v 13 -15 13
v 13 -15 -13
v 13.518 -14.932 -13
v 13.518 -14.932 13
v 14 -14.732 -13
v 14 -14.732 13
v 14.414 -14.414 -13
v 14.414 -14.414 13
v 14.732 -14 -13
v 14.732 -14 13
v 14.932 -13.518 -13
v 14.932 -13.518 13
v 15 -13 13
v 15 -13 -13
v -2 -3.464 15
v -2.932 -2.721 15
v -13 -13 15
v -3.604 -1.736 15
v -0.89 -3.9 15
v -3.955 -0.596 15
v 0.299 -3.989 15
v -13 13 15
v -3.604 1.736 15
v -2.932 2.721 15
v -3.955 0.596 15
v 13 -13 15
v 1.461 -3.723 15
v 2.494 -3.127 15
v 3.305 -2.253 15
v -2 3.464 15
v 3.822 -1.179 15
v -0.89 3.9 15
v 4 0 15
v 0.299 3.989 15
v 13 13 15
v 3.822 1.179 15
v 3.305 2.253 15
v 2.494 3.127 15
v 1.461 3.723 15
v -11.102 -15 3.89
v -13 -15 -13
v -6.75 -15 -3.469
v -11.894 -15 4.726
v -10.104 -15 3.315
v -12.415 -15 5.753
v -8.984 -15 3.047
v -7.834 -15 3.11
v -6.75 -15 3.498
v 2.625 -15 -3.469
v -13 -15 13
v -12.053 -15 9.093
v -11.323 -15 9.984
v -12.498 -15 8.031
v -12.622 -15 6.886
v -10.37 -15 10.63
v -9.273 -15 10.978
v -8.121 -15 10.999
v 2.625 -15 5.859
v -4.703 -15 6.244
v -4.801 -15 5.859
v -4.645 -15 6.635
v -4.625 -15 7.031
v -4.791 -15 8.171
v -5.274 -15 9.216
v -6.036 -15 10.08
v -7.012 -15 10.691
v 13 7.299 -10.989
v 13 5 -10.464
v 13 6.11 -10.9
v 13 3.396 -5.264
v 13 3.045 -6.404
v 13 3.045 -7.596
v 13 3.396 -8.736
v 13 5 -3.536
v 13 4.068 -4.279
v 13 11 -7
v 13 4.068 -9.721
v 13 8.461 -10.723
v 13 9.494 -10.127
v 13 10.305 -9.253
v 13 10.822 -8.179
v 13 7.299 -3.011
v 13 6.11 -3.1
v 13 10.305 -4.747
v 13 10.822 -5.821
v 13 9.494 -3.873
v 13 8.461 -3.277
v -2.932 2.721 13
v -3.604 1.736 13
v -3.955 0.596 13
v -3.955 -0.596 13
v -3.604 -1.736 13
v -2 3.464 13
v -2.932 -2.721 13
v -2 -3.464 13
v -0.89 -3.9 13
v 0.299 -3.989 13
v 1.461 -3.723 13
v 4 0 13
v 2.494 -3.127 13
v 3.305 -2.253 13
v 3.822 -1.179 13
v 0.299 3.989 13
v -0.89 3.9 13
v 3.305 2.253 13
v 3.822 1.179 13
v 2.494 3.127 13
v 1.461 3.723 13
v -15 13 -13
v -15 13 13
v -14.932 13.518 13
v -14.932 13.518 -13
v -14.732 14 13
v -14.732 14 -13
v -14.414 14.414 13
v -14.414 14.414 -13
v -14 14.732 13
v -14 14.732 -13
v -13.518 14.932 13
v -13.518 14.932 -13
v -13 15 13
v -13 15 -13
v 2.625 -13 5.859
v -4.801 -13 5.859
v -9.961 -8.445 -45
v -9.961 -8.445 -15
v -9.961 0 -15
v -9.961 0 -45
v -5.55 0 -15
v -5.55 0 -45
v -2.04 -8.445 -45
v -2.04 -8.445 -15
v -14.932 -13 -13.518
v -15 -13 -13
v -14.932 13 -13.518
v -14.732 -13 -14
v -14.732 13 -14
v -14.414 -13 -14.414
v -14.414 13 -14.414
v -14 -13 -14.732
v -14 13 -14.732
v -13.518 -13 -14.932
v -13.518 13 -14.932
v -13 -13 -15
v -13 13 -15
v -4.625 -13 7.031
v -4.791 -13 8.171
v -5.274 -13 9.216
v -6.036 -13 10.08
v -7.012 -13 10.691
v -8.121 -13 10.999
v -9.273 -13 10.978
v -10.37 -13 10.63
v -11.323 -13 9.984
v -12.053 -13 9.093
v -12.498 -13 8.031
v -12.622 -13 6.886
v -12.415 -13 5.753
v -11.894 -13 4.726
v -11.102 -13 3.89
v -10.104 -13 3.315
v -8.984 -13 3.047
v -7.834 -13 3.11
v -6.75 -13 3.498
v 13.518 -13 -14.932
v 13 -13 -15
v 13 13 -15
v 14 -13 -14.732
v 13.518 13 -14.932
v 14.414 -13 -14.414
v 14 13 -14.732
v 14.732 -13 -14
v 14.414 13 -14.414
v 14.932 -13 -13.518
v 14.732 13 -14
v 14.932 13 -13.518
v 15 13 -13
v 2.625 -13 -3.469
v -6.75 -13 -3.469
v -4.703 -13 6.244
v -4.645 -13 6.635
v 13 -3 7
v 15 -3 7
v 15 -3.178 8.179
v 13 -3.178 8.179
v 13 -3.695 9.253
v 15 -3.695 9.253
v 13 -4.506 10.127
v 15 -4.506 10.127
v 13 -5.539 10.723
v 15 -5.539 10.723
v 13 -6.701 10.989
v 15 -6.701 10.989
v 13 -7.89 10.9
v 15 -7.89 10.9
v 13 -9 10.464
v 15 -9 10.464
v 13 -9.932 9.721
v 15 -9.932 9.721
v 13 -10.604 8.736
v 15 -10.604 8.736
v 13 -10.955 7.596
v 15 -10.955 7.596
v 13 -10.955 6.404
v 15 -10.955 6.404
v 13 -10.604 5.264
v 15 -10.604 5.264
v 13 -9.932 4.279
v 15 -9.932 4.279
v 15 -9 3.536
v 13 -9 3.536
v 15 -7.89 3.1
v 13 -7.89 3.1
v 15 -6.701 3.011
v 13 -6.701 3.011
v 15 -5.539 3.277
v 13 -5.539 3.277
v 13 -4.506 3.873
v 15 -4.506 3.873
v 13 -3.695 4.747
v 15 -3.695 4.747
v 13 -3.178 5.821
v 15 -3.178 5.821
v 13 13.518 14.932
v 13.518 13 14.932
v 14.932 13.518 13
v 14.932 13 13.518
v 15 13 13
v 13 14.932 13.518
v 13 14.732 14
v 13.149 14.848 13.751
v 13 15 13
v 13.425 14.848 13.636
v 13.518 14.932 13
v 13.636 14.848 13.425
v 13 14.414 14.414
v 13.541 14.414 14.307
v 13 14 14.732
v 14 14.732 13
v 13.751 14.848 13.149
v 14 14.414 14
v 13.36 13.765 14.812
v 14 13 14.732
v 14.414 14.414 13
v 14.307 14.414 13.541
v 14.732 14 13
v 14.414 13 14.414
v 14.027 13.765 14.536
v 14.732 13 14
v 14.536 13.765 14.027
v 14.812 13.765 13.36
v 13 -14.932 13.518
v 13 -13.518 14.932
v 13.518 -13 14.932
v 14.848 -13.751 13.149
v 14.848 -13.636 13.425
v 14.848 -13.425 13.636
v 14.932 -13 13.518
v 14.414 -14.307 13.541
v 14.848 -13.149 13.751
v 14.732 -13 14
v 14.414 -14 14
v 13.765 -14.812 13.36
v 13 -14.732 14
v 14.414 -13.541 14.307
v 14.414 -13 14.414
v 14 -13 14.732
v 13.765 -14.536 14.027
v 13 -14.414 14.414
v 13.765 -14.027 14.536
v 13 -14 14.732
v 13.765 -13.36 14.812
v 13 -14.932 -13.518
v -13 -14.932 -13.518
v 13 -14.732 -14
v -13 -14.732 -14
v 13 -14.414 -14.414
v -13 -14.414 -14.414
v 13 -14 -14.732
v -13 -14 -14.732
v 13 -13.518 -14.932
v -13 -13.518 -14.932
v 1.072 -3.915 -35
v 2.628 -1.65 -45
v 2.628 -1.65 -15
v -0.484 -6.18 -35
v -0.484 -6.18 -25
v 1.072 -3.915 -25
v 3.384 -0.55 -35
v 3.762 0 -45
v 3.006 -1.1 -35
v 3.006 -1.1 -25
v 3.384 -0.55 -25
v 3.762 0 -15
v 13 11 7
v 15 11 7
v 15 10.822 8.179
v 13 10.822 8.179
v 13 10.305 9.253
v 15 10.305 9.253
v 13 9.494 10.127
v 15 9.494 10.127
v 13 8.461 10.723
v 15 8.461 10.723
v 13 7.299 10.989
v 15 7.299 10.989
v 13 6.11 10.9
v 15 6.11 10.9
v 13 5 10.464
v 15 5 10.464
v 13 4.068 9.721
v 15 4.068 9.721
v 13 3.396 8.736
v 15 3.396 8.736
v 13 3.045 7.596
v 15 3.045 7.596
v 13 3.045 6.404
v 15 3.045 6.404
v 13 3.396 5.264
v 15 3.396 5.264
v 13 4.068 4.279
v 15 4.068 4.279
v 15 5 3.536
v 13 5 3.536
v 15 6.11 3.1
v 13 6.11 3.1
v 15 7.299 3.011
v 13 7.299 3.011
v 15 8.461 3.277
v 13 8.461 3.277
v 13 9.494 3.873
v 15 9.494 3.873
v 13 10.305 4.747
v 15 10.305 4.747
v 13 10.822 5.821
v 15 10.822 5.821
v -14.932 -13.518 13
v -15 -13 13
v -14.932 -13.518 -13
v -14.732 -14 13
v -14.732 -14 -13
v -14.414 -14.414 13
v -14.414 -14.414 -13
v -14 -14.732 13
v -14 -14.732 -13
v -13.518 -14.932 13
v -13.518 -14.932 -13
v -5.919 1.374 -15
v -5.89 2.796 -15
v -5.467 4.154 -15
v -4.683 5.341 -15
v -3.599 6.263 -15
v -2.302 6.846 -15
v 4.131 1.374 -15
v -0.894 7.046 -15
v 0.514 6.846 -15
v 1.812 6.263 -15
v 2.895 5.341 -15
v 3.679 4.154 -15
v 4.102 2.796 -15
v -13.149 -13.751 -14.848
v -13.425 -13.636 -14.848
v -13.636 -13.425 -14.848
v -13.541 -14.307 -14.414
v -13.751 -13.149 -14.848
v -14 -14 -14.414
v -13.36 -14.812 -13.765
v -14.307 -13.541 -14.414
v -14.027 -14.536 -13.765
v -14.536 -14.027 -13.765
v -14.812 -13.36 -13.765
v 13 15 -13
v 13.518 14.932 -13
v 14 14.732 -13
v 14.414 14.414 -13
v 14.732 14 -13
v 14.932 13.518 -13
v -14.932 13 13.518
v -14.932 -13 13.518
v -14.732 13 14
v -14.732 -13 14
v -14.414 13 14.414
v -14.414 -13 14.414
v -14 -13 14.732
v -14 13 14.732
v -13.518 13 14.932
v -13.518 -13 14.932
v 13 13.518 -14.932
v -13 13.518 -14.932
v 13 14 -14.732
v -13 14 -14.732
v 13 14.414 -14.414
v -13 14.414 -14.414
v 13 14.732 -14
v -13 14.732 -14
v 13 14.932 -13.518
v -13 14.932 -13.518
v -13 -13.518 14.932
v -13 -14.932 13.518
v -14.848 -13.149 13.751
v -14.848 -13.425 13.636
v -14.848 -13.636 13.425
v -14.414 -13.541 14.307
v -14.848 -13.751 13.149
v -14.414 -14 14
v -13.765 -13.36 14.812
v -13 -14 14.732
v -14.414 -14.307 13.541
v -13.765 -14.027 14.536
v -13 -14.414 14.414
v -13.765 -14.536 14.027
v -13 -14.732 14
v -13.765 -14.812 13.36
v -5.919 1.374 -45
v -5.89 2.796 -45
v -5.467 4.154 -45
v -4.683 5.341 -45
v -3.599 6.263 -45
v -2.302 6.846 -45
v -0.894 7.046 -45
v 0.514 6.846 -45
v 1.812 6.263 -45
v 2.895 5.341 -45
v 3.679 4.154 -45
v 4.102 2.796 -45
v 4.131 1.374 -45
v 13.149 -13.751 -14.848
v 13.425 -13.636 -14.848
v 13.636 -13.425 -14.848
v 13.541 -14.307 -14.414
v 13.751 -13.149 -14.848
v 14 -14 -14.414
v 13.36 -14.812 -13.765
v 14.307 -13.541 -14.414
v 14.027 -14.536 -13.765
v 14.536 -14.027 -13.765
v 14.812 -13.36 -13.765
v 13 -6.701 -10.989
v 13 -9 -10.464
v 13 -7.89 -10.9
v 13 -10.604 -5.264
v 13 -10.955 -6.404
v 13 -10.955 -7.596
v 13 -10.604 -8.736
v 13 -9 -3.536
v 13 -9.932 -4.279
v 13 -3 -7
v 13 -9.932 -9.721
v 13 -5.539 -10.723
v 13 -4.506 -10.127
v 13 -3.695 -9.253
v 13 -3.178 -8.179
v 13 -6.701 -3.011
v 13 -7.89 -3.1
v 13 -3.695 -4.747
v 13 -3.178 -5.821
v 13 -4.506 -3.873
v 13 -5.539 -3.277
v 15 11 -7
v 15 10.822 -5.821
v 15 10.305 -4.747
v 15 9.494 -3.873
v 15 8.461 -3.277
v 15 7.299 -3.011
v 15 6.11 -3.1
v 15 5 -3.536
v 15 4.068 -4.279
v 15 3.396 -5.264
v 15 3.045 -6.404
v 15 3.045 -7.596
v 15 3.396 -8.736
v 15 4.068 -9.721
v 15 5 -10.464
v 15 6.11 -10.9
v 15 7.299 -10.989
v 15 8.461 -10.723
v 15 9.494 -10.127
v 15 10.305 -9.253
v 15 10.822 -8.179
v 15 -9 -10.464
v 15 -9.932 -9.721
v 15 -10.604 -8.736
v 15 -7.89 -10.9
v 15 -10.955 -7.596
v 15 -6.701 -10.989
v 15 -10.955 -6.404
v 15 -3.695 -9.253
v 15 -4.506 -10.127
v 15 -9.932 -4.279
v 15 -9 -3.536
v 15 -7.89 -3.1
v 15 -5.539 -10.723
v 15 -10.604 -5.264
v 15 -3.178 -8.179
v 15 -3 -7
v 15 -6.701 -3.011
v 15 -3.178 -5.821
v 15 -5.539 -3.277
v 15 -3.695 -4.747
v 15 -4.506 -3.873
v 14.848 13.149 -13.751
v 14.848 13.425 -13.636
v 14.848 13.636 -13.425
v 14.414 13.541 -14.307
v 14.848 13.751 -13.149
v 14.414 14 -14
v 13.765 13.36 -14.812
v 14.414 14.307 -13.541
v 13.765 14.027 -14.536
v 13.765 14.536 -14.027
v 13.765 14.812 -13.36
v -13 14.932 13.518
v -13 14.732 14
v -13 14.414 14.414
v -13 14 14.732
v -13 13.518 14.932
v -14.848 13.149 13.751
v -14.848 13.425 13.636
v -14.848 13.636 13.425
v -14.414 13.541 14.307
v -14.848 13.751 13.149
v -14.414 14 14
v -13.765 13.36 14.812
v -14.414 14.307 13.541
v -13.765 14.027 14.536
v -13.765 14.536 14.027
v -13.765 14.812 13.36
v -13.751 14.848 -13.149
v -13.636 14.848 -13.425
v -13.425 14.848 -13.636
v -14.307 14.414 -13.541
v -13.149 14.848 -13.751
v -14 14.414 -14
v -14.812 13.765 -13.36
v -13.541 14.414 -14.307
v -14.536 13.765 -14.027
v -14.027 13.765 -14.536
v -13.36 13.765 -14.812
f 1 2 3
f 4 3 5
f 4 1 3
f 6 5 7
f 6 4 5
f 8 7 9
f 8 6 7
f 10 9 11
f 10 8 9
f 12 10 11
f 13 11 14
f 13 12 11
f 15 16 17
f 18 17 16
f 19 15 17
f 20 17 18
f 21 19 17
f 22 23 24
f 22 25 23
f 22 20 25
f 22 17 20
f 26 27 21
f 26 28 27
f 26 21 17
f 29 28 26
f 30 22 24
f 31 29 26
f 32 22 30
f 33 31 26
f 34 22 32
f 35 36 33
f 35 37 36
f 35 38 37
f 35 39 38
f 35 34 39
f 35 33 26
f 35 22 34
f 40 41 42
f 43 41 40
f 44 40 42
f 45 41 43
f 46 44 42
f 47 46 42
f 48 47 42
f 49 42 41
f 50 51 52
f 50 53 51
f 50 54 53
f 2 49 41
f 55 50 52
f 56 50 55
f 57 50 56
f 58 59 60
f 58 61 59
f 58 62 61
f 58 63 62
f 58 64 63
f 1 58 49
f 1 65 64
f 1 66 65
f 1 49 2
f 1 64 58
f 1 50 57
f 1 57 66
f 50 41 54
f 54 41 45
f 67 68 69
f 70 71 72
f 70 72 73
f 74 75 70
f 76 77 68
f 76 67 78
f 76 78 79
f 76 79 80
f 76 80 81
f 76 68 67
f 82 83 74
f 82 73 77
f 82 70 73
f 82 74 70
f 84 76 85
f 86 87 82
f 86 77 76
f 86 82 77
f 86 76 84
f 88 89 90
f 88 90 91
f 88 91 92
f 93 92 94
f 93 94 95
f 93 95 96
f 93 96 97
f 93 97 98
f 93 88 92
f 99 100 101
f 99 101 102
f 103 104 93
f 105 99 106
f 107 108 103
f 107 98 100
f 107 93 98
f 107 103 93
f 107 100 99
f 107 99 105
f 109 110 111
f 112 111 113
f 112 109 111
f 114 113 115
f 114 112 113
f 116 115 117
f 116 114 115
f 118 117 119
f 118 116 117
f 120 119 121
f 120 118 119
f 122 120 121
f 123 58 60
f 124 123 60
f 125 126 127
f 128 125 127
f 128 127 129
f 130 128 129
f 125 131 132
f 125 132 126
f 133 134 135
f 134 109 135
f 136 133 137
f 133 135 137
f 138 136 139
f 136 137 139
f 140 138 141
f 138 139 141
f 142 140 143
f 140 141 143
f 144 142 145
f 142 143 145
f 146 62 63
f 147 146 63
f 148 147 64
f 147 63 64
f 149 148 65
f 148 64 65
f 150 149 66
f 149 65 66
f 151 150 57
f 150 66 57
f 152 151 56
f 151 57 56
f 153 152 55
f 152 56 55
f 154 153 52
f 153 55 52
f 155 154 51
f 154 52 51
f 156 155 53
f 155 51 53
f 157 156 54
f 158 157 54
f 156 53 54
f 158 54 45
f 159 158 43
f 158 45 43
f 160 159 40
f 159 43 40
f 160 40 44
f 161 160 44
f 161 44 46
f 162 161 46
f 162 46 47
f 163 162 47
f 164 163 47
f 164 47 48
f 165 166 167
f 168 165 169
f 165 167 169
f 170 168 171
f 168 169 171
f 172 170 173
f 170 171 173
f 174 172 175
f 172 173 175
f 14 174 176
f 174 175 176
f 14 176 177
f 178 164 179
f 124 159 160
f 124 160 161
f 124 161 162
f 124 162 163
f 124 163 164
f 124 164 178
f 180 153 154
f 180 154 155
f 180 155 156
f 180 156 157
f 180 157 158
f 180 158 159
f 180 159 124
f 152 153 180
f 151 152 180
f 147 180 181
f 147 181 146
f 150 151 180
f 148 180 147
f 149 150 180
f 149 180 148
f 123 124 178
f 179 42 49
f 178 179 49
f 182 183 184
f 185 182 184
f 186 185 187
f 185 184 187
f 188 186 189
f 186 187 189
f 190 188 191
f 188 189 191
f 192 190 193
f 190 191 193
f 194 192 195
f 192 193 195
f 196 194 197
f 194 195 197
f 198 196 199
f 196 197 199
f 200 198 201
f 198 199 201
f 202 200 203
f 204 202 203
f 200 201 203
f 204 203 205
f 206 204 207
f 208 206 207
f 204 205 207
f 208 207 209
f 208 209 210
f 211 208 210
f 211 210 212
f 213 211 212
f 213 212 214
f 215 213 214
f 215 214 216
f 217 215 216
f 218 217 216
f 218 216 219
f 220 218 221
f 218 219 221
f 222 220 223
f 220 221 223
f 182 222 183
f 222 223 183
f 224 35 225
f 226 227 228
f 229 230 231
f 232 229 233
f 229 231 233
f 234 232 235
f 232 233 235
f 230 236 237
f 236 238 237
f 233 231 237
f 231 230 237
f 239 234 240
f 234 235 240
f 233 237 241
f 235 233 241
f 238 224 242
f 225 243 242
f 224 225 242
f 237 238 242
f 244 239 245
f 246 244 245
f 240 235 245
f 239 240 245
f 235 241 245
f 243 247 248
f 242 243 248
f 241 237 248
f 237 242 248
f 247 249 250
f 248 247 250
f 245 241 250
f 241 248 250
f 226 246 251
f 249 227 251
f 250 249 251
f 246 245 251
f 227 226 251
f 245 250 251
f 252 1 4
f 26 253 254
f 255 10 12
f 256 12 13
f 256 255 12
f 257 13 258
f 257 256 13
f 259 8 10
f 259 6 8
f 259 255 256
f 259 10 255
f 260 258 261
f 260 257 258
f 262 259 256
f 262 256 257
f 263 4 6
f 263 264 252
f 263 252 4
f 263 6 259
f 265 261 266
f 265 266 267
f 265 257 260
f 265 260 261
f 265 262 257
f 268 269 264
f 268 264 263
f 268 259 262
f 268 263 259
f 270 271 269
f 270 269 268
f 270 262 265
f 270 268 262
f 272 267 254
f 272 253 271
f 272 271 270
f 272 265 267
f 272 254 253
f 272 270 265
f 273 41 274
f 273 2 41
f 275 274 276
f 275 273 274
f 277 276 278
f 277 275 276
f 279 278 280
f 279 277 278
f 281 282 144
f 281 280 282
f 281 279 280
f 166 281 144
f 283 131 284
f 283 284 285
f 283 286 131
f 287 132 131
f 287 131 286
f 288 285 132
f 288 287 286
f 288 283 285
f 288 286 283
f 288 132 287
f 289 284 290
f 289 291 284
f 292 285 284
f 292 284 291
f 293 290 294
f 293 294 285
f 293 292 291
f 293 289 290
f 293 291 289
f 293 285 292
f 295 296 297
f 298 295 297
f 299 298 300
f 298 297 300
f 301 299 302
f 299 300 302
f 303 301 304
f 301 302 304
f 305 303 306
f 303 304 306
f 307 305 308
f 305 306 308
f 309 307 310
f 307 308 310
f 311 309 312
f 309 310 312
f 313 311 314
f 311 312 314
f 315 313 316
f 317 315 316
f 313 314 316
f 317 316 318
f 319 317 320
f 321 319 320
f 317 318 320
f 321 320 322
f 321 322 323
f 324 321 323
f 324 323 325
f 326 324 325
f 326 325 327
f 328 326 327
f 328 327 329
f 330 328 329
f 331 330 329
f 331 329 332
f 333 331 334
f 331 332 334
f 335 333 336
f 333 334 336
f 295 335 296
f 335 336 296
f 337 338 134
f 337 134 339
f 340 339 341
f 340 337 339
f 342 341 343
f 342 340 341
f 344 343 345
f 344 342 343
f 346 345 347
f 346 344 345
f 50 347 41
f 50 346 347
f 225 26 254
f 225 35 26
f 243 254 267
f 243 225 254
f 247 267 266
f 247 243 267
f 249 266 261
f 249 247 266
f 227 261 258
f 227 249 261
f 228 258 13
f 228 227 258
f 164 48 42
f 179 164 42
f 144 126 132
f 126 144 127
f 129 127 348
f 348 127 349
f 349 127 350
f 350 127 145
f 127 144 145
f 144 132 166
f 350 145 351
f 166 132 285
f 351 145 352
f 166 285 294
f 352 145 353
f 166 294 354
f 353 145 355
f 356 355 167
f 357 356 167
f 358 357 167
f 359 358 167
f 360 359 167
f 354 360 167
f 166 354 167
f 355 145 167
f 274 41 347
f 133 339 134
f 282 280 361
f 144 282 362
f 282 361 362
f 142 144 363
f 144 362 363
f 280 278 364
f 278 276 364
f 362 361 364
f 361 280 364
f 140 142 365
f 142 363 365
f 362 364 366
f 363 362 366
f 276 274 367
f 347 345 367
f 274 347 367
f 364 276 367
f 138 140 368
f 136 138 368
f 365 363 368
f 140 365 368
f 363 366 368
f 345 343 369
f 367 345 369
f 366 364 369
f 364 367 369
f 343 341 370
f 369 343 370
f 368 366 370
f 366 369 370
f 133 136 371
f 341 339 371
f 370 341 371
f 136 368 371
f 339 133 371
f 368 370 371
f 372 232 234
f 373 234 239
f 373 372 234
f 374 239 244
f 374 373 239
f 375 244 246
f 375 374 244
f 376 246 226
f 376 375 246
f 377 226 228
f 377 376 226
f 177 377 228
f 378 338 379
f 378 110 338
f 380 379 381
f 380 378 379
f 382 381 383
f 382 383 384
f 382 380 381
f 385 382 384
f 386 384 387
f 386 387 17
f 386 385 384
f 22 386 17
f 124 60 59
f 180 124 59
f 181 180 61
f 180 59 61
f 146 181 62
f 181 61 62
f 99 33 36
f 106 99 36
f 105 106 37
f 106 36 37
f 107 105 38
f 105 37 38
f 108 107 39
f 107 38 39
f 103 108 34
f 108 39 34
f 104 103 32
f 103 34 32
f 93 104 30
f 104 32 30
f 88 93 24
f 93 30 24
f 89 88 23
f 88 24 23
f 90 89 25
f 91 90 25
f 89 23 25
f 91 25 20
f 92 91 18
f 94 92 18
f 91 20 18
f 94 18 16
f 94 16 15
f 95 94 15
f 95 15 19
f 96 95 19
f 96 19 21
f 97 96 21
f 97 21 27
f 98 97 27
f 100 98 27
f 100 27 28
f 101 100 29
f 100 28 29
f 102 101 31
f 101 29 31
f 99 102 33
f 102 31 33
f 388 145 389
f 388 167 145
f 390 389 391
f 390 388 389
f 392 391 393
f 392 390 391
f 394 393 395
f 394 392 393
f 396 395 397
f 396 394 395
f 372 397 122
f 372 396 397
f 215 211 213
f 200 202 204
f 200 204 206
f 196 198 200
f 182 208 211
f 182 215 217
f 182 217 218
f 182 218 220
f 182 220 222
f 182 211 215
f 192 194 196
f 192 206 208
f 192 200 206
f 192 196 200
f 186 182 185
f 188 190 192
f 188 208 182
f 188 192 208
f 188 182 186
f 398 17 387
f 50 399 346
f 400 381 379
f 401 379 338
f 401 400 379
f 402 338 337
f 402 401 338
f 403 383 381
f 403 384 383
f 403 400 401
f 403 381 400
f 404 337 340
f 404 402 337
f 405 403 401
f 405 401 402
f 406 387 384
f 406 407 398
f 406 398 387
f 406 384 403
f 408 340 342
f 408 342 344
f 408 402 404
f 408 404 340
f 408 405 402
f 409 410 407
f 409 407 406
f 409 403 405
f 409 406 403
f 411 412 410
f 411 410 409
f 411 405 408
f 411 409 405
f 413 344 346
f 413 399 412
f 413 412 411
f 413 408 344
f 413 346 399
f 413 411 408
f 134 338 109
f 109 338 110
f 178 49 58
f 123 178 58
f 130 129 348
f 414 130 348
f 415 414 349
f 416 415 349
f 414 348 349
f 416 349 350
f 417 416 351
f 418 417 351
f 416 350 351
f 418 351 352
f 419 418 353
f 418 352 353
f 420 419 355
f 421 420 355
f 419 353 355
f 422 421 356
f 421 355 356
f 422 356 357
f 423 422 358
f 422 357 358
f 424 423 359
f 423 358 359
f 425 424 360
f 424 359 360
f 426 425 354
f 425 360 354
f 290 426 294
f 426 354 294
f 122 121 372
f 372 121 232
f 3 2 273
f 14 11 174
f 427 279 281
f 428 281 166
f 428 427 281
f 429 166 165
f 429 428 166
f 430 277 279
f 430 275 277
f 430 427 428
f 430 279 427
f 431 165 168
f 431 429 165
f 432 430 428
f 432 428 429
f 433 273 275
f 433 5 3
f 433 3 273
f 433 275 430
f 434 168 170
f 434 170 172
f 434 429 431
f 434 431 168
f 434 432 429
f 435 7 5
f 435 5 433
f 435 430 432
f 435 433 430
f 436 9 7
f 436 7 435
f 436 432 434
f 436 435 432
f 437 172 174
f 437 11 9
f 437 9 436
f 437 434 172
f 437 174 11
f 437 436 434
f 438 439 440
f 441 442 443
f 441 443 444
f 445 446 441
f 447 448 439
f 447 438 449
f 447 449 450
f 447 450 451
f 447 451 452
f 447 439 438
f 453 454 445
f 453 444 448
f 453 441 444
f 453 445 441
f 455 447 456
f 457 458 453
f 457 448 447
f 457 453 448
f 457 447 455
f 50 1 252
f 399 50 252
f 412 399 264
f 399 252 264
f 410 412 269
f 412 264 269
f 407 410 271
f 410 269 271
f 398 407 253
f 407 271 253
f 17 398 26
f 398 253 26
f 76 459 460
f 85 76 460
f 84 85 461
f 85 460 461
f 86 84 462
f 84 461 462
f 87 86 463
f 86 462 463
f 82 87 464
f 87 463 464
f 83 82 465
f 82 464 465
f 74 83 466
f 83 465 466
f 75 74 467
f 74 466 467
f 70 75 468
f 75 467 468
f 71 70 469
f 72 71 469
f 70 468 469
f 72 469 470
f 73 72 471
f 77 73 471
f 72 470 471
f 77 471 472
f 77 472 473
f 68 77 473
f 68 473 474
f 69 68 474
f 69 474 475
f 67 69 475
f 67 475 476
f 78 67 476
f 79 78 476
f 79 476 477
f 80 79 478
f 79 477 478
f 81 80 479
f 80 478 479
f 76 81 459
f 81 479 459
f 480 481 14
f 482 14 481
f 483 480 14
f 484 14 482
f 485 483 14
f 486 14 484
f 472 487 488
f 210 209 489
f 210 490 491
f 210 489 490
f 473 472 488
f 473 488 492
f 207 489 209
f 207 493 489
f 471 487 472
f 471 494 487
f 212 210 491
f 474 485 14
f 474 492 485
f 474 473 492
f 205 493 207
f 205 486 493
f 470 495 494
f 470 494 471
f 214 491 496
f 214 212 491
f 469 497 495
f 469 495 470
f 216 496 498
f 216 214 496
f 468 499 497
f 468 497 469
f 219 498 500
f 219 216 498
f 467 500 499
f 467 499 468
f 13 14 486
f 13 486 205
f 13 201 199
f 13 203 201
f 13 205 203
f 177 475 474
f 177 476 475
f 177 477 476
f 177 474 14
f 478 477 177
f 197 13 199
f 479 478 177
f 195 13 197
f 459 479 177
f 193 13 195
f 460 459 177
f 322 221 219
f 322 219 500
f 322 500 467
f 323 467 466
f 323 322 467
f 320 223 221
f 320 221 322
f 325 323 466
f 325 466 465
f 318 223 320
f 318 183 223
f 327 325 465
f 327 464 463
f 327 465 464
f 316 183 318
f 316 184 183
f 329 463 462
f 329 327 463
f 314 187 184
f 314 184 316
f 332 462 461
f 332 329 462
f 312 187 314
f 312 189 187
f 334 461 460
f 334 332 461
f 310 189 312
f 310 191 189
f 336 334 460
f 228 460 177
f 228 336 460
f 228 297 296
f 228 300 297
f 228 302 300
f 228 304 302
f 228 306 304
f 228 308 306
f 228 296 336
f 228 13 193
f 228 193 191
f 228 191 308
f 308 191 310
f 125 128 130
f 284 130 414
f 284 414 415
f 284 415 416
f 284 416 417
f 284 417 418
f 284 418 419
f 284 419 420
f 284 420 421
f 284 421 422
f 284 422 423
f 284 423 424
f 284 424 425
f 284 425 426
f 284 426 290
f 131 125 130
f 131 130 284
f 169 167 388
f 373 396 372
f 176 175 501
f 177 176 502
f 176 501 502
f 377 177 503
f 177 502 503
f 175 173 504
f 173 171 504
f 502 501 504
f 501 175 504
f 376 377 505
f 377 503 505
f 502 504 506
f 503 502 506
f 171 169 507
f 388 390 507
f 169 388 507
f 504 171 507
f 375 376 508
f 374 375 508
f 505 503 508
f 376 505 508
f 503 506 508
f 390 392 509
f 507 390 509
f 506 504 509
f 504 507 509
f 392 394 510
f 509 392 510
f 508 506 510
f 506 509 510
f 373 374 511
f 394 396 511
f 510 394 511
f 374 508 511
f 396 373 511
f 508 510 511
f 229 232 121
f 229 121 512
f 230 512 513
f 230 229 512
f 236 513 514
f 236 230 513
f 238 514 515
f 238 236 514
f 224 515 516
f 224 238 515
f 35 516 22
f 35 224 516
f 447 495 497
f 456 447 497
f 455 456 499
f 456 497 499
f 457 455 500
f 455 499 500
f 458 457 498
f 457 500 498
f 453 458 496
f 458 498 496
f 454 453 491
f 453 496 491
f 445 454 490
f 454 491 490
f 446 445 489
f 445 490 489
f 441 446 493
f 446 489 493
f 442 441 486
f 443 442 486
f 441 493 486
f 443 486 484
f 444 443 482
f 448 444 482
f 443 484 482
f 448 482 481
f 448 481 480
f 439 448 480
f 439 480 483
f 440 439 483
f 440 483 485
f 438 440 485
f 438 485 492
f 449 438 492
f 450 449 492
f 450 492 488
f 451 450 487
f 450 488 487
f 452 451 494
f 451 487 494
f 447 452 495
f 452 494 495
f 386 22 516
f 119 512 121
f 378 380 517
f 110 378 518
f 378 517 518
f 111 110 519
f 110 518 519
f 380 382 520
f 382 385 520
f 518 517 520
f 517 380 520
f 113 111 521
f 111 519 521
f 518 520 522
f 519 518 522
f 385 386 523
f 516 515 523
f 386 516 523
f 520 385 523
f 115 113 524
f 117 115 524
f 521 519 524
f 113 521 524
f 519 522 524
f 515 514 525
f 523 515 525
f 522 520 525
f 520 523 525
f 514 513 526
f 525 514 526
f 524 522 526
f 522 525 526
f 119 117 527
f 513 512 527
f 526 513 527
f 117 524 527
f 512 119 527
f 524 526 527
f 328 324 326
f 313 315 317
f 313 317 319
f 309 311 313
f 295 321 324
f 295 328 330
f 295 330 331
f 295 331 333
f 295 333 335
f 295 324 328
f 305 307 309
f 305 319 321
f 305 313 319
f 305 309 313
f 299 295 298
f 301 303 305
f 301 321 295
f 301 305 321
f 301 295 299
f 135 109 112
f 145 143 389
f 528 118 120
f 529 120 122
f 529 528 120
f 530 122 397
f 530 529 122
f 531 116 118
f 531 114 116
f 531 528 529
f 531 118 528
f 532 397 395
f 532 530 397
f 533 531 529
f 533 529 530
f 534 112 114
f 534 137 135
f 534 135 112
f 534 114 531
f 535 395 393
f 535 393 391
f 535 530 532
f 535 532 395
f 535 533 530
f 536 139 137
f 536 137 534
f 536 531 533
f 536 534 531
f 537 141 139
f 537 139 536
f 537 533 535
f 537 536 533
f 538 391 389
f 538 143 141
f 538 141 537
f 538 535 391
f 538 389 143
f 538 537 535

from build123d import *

# Parameters (mm, degrees)
F0_W      = 30
F0_H      = 30
F1_DEPTH  = 15
F2_R      = 4
F3_DEPTH  = 2
F4_R      = 4
F5_DEPTH  = 2
F7_DEPTH  = 2
F8_R      = 2
F10_DEPTH = 30


with BuildPart() as f1:
    # F0 (on Top) → F1 (new body, symmetric)
    with BuildSketch(Plane.XY):
        Rectangle(F0_W, F0_H)
    extrude(amount=F1_DEPTH, both=True)

    # F2 (on face) → F3 (cut)
    with BuildSketch(Plane.XY.offset(15)):
        Circle(F2_R)
    extrude(amount=-F3_DEPTH, mode=Mode.SUBTRACT)

    # F4 (on face) → F5 (cut)
    with BuildSketch(Plane.YZ.offset(15)):
        with Locations((-7, -7)):
            Circle(F4_R)
        with Locations((7, -7)):
            Circle(F4_R)
        with Locations((7, 7)):
            Circle(F4_R)
        with Locations((-7, 7)):
            Circle(F4_R)
    extrude(amount=-F5_DEPTH, mode=Mode.SUBTRACT)

    # F6 (on face) → F7 (cut)
    with BuildSketch(Plane.XZ.offset(15)):
        with BuildLine():
            ThreePointArc((-4.8005116586, 5.859375), (-4.6691210888, 6.4387772411), (-4.6249997839, 7.0312498137))
            ThreePointArc((-4.6249997839, 7.0312498137), (-12.0528271059, 9.0928025904), (-6.7499997094, 3.497926347))
            Line((-6.7499997094, 3.497926347), (-6.7499997094, 5.859375))
            Line((-6.7499997094, 5.859375), (-4.8005116586, 5.859375))
        make_face()
        with BuildLine():
            Line((-6.7499997094, 5.859375), (-6.7499997094, 3.497926347))
            ThreePointArc((-6.7499997094, 3.497926347), (-5.5403358849, 4.4847132187), (-4.8005116586, 5.859375))
            Line((-4.8005116586, 5.859375), (-6.7499997094, 5.859375))
        make_face()
        with BuildLine():
            ThreePointArc((-4.8005116586, 5.859375), (-5.5403358849, 4.4847132187), (-6.7499997094, 3.497926347))
            Line((-6.7499997094, 3.497926347), (-6.7499997094, -3.4687498119))
            Line((-6.7499997094, -3.4687498119), (2.6249999646, -3.4687498119))
            Line((2.6249999646, -3.4687498119), (2.6249999646, 5.859375))
            Line((2.6249999646, 5.859375), (-4.8005116586, 5.859375))
        make_face()
    extrude(amount=-F7_DEPTH, mode=Mode.SUBTRACT)

    # F8
    f8_edges = [f1.edges().sort_by_distance(p)[0] for p in [
        (0, -15, 15),
        (15, -15, 0),
        (15, 0, 15),
        (0, 15, 15),
        (-15, 0, 15),
        (-15, -15, 0),
        (0, -15, -15),
        (-15, 0, -15),
        (-15, 15, 0),
        (0, 15, -15),
        (15, 0, -15),
        (15, 15, 0),
    ]]
    fillet(f8_edges, radius=F8_R)

    # F9 (on face) → F10 (join)
    with BuildSketch(Plane(origin=(0, 0, -15), x_dir=(1, 0, 0), z_dir=(0, 0, -1))):
        with BuildLine():
            Line((-2.0403189119, 8.4453830495), (-9.9605508149, 8.4453830495))
            Line((-9.9605508149, 8.4453830495), (-9.9605508149, 0))
            Line((-9.9605508149, 0), (-5.5503539013, 0))
            ThreePointArc((-5.5503539013, 0), (-0.8939548861, -7.0463220271), (3.7624441291, 0))
            add(Edge.make_bspline(
                [(2.6284841664, 1.6503734824), (3.0064708206, 1.1002489883), (3.3844574749, 0.5501244941), (3.7624441291, 0)],
                knots=[8.2443845859, 8.2443845859, 8.2443845859, 8.2443845859, 10.2467826055, 10.2467826055, 10.2467826055, 10.2467826055], degree=3))
            add(Edge.make_bspline(
                [(-2.0403189119, 8.4453830495), (-0.4840512191, 6.1803798605), (1.0722164736, 3.9153766715), (2.6284841664, 1.6503734824)],
                knots=[0, 0, 0, 0, 8.2443845859, 8.2443845859, 8.2443845859, 8.2443845859], degree=3))
        make_face()
    extrude(amount=F10_DEPTH)


solid = f1.part
